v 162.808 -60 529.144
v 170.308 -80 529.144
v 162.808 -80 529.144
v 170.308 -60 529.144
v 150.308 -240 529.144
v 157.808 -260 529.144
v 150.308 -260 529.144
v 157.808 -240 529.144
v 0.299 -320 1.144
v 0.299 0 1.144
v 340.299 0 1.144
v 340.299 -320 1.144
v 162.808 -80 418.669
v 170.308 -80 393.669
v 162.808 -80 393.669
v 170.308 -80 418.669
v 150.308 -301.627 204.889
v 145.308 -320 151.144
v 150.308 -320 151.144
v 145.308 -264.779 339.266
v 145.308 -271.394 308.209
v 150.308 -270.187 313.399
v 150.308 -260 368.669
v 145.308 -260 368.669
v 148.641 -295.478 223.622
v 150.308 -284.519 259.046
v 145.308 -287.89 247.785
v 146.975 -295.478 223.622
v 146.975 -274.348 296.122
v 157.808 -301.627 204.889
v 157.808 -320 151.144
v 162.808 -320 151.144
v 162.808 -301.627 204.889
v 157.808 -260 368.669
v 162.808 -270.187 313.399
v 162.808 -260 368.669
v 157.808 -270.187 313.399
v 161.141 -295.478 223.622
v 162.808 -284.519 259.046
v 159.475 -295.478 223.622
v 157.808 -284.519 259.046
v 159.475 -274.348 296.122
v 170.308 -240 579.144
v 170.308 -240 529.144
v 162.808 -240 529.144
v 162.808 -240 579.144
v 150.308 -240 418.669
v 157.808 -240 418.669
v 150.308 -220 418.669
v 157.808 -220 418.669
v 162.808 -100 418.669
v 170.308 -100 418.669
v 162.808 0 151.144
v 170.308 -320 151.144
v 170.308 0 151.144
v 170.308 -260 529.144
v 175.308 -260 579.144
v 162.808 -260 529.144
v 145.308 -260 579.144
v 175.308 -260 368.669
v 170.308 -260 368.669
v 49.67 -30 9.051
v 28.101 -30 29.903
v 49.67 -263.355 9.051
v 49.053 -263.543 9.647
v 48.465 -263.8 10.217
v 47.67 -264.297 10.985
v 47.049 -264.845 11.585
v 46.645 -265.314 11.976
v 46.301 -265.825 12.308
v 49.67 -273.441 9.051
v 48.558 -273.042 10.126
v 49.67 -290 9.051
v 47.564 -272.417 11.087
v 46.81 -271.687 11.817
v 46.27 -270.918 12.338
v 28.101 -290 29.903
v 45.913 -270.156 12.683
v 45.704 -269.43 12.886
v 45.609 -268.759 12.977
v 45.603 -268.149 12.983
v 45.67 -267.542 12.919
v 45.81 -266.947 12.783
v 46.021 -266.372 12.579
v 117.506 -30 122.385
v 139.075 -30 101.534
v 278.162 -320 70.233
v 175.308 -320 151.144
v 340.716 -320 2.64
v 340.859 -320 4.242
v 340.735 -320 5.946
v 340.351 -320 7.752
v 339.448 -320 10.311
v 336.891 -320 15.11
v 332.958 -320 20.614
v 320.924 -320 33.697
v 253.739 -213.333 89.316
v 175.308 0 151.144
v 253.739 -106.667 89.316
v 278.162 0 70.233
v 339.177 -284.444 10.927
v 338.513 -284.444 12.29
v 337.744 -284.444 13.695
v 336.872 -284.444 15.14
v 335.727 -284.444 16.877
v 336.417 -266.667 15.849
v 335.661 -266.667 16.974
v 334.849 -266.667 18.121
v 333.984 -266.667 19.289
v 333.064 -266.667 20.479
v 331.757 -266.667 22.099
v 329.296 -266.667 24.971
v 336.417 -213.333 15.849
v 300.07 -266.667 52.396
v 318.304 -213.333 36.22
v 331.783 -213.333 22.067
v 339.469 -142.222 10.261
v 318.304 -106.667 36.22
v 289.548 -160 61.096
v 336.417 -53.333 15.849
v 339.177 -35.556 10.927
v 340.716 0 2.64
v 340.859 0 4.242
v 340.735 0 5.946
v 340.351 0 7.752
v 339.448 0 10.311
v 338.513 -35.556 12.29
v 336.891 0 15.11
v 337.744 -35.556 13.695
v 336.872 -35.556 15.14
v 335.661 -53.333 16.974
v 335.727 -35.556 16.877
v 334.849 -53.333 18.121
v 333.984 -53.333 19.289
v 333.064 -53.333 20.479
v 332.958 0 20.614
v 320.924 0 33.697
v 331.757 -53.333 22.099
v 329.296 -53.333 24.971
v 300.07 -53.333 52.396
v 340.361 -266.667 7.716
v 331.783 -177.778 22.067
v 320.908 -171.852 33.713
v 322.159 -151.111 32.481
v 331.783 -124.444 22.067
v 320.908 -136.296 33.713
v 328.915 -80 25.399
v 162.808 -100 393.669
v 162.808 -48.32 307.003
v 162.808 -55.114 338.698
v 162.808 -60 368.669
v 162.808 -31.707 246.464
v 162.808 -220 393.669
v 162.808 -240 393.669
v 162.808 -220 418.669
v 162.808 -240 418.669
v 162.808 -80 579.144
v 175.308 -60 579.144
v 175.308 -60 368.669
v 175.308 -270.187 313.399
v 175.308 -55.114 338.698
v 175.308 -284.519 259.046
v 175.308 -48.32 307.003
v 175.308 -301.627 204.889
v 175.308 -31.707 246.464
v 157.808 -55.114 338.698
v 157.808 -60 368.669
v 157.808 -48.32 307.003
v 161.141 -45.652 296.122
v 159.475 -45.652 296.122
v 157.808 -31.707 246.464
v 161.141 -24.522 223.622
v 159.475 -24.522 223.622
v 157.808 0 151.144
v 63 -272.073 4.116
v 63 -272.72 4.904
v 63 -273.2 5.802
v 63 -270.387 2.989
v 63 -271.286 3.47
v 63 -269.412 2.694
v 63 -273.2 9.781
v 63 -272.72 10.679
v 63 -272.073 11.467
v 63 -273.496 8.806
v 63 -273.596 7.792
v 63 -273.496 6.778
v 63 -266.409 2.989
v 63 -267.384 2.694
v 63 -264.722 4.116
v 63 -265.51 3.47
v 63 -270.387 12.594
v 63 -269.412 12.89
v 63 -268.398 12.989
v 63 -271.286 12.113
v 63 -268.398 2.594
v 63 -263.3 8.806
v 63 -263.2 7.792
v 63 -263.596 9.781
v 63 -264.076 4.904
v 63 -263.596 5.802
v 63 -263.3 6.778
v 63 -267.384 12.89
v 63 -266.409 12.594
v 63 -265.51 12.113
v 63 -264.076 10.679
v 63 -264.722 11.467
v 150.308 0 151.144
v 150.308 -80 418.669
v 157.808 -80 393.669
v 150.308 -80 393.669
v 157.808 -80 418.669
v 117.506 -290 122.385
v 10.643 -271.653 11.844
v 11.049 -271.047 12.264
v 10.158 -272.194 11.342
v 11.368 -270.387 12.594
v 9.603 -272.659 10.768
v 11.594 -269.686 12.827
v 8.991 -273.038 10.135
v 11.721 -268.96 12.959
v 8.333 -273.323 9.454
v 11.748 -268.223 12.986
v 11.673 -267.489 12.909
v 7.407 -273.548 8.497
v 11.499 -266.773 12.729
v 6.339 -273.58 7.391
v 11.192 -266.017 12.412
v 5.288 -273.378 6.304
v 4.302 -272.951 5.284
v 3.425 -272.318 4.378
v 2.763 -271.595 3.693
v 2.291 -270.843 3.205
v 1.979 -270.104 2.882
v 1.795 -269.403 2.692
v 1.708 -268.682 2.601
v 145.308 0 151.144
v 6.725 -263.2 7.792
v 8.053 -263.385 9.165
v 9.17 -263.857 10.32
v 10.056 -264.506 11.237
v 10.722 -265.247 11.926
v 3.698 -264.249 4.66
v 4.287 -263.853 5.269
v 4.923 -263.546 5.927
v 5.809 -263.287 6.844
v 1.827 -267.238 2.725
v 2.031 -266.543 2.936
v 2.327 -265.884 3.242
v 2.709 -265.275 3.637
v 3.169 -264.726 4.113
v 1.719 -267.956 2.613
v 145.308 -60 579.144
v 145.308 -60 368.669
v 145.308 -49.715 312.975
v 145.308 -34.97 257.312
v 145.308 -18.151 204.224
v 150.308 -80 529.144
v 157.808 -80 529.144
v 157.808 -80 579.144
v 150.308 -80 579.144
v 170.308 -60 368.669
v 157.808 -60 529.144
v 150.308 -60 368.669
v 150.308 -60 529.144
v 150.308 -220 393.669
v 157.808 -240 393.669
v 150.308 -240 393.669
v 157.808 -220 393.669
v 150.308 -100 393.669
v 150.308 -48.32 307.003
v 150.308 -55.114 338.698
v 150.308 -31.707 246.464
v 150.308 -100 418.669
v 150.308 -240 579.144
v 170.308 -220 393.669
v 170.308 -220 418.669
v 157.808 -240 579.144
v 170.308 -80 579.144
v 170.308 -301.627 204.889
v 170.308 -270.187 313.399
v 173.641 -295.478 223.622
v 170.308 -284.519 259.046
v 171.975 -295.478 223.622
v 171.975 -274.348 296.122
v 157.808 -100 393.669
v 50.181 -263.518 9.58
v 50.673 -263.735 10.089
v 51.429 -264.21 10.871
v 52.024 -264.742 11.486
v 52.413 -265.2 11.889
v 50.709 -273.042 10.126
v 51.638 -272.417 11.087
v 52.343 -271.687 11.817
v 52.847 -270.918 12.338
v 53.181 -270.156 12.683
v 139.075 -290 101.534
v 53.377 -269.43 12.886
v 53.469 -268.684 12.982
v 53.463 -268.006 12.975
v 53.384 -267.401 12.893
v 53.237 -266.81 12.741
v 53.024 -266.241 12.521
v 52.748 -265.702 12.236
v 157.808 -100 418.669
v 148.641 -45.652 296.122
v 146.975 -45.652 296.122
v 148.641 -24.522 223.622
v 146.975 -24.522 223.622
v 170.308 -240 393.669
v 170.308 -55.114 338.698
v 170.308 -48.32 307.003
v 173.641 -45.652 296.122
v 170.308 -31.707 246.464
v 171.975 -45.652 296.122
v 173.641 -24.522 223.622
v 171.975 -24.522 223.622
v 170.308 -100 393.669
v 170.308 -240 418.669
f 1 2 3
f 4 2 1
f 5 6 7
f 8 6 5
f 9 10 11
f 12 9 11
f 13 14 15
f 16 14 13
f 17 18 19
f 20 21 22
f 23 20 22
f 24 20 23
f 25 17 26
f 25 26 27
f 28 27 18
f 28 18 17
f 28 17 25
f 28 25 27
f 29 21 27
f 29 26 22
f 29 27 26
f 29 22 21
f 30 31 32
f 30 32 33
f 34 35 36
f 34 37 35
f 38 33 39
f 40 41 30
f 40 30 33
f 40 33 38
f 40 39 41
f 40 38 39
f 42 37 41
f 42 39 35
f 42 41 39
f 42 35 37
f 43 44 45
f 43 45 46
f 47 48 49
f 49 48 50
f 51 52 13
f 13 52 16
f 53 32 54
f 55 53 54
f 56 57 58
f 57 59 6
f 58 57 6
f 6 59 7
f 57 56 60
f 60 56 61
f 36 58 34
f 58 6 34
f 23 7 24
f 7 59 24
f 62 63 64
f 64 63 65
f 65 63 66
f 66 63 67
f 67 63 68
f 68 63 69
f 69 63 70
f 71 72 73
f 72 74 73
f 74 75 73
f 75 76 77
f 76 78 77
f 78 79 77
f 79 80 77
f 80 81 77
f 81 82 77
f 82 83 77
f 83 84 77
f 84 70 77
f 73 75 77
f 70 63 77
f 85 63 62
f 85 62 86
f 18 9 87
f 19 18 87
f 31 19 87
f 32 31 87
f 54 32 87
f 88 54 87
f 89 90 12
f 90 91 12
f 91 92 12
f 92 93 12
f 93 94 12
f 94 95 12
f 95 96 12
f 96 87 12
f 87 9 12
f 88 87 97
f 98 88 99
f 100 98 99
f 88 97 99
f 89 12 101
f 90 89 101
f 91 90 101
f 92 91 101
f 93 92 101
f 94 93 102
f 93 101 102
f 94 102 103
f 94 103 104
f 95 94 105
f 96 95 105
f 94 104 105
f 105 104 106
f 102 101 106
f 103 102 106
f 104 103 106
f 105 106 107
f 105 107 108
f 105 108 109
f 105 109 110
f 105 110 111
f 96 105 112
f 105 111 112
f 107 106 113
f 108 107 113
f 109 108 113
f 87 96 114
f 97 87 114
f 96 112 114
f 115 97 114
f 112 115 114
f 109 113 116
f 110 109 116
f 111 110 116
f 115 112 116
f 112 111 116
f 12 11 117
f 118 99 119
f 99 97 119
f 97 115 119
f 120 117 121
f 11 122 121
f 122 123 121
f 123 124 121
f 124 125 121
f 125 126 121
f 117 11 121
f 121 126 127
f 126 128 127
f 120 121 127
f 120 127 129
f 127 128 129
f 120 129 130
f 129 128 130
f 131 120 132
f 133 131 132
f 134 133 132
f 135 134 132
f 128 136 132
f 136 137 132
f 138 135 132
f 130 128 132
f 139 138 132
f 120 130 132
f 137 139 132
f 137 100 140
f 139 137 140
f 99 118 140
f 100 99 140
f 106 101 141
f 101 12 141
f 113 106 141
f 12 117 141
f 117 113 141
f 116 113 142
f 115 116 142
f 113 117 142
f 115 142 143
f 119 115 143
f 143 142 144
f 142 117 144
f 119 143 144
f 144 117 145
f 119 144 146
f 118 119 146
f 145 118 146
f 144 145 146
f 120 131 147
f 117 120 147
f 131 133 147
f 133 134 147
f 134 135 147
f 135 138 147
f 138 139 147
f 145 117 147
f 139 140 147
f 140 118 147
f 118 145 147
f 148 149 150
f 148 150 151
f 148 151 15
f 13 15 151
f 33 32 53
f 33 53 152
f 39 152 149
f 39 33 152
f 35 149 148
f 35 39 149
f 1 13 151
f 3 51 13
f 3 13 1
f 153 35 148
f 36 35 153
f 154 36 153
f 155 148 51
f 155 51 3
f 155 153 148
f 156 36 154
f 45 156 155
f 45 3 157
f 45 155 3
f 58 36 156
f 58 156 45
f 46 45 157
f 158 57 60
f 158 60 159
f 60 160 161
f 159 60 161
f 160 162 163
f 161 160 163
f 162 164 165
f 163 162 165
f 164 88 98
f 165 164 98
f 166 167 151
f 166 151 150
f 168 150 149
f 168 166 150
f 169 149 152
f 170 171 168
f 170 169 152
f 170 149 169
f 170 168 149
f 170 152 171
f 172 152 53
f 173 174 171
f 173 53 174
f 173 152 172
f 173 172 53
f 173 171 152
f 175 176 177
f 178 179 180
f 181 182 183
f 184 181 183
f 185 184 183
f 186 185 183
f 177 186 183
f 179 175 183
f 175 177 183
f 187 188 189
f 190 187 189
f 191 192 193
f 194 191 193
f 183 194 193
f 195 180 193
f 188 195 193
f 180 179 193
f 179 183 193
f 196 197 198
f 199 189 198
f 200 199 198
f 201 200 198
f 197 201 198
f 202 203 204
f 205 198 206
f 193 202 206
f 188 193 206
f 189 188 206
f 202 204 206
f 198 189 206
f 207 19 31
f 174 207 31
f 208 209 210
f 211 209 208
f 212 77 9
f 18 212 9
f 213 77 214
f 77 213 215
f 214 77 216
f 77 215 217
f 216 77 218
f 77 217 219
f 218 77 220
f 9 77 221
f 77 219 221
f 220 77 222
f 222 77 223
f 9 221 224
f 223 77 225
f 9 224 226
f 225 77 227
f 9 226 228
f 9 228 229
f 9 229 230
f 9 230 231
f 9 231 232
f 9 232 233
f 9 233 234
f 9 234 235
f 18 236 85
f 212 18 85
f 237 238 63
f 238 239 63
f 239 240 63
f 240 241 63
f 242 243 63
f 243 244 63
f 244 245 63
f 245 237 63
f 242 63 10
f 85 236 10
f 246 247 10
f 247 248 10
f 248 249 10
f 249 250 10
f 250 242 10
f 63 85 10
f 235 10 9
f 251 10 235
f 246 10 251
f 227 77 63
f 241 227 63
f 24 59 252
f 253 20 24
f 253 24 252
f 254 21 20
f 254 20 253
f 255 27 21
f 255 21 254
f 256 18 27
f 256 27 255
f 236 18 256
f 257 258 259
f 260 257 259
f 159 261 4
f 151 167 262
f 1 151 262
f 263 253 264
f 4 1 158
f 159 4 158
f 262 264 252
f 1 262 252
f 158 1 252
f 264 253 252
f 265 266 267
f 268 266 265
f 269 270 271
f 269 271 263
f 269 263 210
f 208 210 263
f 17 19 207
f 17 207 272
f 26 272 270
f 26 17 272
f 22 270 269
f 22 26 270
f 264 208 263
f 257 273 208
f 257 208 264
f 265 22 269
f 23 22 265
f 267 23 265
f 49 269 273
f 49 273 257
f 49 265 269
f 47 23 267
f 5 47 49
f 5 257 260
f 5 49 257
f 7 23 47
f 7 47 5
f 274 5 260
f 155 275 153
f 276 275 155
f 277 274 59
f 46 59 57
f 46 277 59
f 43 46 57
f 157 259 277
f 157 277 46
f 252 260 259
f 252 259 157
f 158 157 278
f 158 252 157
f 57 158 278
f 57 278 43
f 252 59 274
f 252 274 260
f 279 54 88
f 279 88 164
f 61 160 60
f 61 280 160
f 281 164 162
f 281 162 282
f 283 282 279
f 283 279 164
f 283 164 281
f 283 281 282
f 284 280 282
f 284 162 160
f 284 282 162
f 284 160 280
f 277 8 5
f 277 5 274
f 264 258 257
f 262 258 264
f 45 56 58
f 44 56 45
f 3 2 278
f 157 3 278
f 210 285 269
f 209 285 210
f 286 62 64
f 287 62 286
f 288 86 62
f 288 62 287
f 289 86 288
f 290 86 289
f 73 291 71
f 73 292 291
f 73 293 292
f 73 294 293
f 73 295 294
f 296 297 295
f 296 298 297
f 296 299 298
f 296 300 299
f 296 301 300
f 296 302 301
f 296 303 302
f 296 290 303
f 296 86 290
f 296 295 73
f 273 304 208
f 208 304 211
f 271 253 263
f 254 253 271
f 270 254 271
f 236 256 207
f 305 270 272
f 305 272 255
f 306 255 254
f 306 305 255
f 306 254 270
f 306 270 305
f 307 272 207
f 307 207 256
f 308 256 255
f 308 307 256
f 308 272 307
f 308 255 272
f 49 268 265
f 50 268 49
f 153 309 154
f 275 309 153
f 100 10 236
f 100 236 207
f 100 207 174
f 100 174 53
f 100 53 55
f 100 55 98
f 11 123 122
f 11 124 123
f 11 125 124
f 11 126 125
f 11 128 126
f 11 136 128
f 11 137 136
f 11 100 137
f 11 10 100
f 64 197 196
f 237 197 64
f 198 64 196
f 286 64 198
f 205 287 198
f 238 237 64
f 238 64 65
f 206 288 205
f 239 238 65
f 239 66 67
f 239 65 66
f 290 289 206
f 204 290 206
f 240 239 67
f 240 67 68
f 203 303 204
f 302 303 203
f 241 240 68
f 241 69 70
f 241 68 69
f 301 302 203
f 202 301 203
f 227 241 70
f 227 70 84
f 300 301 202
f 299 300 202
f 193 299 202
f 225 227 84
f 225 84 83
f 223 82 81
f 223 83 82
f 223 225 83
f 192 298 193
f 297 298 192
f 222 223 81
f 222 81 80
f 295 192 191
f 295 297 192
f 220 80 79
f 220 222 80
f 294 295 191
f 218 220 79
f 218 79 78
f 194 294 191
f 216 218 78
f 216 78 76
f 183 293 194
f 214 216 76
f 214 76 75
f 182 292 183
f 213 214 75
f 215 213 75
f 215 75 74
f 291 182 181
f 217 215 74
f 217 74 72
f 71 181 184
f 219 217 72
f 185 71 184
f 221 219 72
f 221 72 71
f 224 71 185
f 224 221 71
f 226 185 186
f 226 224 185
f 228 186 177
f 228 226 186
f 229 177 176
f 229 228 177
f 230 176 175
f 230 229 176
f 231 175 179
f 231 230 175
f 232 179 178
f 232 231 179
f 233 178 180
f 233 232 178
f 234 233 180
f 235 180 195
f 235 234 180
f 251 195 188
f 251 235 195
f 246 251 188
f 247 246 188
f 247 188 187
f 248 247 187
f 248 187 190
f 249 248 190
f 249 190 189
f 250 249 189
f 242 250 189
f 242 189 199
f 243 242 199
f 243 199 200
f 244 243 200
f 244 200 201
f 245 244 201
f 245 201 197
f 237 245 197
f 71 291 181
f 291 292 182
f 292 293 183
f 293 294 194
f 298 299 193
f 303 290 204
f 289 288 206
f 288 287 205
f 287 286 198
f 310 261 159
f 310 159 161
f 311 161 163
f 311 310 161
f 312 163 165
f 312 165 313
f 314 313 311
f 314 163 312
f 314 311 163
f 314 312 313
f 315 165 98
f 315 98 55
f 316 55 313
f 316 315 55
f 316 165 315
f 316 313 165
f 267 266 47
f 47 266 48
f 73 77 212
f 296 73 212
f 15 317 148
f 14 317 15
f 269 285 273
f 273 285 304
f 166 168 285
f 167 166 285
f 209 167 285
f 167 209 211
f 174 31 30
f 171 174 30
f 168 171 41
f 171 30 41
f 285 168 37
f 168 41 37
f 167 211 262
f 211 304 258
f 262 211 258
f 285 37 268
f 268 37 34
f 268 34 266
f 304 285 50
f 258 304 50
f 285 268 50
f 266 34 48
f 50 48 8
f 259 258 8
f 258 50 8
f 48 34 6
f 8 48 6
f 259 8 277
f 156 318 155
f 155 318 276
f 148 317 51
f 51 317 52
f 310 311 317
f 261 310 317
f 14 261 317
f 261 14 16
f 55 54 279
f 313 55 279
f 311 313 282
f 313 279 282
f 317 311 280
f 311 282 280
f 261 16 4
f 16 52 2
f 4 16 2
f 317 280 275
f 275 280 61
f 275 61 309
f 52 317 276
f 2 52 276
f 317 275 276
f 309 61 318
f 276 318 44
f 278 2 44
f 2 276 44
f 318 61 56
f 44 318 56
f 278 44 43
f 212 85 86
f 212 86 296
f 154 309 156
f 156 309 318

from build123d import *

# Parameters (mm, degrees)
F1_DEPTH  = 320
F2_W      = 30
F2_H      = 320
F3_DEPTH  = 428
F5_DEPTH  = 205
F7_W      = 260
F7_H      = 128.6325914682
F8_DEPTH  = 30
F9_W      = 7.5
F9_H      = 457.219858036
F10_DEPTH = 977
F6_W      = 20
F6_H      = 50
F6_H_2    = 25
F11_DEPTH = 25
F12_R     = 5.1978686685
F13_DEPTH = 63


with BuildPart() as f1:
    # F0 (on Front) → F1 (new body)
    with BuildSketch(Plane.XZ):
        with BuildLine():
            Line((150.299176857, 1.1440683747), (180.299176857, 1.1440683747))
            Line((180.299176857, 1.1440683747), (340.299176857, 1.1440683747))
            add(Edge.make_bspline(
                [(340.299176857, 1.1440683747), (349.1569172885, 24.1151609846), (251.1032390966, 88.0444564268), (175.3079980464, 151.1440683747)],
                knots=[0.4586039165, 0.4586039165, 0.4586039165, 0.4586039165, 1, 1, 1, 1], degree=3))
            Line((175.3079980464, 151.1440683747), (145.3079980464, 151.1440683747))
            Line((145.3079980464, 151.1440683747), (0.299176857, 1.1440683747))
            Line((0.299176857, 1.1440683747), (100.299176857, 1.1440683747))
            Line((100.299176857, 1.1440683747), (150.299176857, 1.1440683747))
        make_face()
    extrude(amount=F1_DEPTH)

    # F2 (on face) → F3 (join)
    with BuildSketch(Plane.XY.offset(151.1440683747)):
        with Locations((160.3079980464, -160)):
            Rectangle(F2_W, F2_H)
    extrude(amount=F3_DEPTH)

    # F4 (on face) → F5 (cut)
    with BuildSketch(Plane(origin=(145.3079980464, 0, 0), x_dir=(0, -1, 0), z_dir=(-1, 0, 0))):
        with BuildLine():
            Line((0, 579.1440683747), (0, 151.1440683747))
            add(Edge.make_bspline(
                [(60, 368.6685562134), (50.1739969339, 296.0916949665), (25.086998467, 223.6178816706), (0, 151.1440683747)],
                knots=[0.4913001533, 0.4913001533, 0.4913001533, 0.4913001533, 1, 1, 1, 1], degree=3))
            Line((60, 368.6685562134), (60, 579.1440683747))
            Line((60, 579.1440683747), (0, 579.1440683747))
        make_face()
        with BuildLine():
            add(Edge.make_bspline(
                [(320, 151.1440683747), (294.913001533, 223.6178816706), (269.8260030661, 296.0916949665), (260, 368.6685562134)],
                knots=[0, 0, 0, 0, 0.5086998467, 0.5086998467, 0.5086998467, 0.5086998467], degree=3))
            Line((320, 151.1440683747), (320, 579.1440683747))
            Line((320, 579.1440683747), (260, 579.1440683747))
            Line((260, 579.1440683747), (260, 368.6685562134))
        make_face()
    extrude(amount=-F5_DEPTH, mode=Mode.SUBTRACT)

    # F7 (on face) → F8 (cut)
    with BuildSketch(Plane(origin=(-0.4170581217, 0, 0.4031807106), x_dir=(0, -1, 0), z_dir=(-0.7189672474, 0, 0.6950439534))):
        with Locations((160, 105.3467844897)):
            Rectangle(F7_W, F7_H)
    extrude(amount=-F8_DEPTH, mode=Mode.SUBTRACT)

    # F9 (on face) → F10 (cut)
    with BuildSketch(Plane.XZ.offset(320)):
        with Locations((154.0579980464, 379.7539973927)):
            Rectangle(F9_W, F9_H)
        with Locations((166.5579980464, 379.7539973927)):
            Rectangle(F9_W, F9_H)
    extrude(amount=-F10_DEPTH, mode=Mode.SUBTRACT)

    # F6 (on face) → F11 (join)
    with BuildSketch(Plane.YZ.offset(175.3079980464)):
        with Locations((-250, 554.1440683747)):
            Rectangle(F6_W, F6_H)
        with Locations((-70, 554.1440683747)):
            Rectangle(F6_W, F6_H)
        with Locations((-230, 406.1685562134)):
            Rectangle(F6_W, F6_H_2)
        with Locations((-90, 406.1685562134)):
            Rectangle(F6_W, F6_H_2)
    extrude(amount=-F11_DEPTH)

    # F12 (on Right) → F13 (cut)
    with BuildSketch(Plane.YZ):
        with Locations((-268.3978974819, 7.7915792353)):
            Circle(F12_R)
    extrude(amount=F13_DEPTH, mode=Mode.SUBTRACT)


solid = f1.part
